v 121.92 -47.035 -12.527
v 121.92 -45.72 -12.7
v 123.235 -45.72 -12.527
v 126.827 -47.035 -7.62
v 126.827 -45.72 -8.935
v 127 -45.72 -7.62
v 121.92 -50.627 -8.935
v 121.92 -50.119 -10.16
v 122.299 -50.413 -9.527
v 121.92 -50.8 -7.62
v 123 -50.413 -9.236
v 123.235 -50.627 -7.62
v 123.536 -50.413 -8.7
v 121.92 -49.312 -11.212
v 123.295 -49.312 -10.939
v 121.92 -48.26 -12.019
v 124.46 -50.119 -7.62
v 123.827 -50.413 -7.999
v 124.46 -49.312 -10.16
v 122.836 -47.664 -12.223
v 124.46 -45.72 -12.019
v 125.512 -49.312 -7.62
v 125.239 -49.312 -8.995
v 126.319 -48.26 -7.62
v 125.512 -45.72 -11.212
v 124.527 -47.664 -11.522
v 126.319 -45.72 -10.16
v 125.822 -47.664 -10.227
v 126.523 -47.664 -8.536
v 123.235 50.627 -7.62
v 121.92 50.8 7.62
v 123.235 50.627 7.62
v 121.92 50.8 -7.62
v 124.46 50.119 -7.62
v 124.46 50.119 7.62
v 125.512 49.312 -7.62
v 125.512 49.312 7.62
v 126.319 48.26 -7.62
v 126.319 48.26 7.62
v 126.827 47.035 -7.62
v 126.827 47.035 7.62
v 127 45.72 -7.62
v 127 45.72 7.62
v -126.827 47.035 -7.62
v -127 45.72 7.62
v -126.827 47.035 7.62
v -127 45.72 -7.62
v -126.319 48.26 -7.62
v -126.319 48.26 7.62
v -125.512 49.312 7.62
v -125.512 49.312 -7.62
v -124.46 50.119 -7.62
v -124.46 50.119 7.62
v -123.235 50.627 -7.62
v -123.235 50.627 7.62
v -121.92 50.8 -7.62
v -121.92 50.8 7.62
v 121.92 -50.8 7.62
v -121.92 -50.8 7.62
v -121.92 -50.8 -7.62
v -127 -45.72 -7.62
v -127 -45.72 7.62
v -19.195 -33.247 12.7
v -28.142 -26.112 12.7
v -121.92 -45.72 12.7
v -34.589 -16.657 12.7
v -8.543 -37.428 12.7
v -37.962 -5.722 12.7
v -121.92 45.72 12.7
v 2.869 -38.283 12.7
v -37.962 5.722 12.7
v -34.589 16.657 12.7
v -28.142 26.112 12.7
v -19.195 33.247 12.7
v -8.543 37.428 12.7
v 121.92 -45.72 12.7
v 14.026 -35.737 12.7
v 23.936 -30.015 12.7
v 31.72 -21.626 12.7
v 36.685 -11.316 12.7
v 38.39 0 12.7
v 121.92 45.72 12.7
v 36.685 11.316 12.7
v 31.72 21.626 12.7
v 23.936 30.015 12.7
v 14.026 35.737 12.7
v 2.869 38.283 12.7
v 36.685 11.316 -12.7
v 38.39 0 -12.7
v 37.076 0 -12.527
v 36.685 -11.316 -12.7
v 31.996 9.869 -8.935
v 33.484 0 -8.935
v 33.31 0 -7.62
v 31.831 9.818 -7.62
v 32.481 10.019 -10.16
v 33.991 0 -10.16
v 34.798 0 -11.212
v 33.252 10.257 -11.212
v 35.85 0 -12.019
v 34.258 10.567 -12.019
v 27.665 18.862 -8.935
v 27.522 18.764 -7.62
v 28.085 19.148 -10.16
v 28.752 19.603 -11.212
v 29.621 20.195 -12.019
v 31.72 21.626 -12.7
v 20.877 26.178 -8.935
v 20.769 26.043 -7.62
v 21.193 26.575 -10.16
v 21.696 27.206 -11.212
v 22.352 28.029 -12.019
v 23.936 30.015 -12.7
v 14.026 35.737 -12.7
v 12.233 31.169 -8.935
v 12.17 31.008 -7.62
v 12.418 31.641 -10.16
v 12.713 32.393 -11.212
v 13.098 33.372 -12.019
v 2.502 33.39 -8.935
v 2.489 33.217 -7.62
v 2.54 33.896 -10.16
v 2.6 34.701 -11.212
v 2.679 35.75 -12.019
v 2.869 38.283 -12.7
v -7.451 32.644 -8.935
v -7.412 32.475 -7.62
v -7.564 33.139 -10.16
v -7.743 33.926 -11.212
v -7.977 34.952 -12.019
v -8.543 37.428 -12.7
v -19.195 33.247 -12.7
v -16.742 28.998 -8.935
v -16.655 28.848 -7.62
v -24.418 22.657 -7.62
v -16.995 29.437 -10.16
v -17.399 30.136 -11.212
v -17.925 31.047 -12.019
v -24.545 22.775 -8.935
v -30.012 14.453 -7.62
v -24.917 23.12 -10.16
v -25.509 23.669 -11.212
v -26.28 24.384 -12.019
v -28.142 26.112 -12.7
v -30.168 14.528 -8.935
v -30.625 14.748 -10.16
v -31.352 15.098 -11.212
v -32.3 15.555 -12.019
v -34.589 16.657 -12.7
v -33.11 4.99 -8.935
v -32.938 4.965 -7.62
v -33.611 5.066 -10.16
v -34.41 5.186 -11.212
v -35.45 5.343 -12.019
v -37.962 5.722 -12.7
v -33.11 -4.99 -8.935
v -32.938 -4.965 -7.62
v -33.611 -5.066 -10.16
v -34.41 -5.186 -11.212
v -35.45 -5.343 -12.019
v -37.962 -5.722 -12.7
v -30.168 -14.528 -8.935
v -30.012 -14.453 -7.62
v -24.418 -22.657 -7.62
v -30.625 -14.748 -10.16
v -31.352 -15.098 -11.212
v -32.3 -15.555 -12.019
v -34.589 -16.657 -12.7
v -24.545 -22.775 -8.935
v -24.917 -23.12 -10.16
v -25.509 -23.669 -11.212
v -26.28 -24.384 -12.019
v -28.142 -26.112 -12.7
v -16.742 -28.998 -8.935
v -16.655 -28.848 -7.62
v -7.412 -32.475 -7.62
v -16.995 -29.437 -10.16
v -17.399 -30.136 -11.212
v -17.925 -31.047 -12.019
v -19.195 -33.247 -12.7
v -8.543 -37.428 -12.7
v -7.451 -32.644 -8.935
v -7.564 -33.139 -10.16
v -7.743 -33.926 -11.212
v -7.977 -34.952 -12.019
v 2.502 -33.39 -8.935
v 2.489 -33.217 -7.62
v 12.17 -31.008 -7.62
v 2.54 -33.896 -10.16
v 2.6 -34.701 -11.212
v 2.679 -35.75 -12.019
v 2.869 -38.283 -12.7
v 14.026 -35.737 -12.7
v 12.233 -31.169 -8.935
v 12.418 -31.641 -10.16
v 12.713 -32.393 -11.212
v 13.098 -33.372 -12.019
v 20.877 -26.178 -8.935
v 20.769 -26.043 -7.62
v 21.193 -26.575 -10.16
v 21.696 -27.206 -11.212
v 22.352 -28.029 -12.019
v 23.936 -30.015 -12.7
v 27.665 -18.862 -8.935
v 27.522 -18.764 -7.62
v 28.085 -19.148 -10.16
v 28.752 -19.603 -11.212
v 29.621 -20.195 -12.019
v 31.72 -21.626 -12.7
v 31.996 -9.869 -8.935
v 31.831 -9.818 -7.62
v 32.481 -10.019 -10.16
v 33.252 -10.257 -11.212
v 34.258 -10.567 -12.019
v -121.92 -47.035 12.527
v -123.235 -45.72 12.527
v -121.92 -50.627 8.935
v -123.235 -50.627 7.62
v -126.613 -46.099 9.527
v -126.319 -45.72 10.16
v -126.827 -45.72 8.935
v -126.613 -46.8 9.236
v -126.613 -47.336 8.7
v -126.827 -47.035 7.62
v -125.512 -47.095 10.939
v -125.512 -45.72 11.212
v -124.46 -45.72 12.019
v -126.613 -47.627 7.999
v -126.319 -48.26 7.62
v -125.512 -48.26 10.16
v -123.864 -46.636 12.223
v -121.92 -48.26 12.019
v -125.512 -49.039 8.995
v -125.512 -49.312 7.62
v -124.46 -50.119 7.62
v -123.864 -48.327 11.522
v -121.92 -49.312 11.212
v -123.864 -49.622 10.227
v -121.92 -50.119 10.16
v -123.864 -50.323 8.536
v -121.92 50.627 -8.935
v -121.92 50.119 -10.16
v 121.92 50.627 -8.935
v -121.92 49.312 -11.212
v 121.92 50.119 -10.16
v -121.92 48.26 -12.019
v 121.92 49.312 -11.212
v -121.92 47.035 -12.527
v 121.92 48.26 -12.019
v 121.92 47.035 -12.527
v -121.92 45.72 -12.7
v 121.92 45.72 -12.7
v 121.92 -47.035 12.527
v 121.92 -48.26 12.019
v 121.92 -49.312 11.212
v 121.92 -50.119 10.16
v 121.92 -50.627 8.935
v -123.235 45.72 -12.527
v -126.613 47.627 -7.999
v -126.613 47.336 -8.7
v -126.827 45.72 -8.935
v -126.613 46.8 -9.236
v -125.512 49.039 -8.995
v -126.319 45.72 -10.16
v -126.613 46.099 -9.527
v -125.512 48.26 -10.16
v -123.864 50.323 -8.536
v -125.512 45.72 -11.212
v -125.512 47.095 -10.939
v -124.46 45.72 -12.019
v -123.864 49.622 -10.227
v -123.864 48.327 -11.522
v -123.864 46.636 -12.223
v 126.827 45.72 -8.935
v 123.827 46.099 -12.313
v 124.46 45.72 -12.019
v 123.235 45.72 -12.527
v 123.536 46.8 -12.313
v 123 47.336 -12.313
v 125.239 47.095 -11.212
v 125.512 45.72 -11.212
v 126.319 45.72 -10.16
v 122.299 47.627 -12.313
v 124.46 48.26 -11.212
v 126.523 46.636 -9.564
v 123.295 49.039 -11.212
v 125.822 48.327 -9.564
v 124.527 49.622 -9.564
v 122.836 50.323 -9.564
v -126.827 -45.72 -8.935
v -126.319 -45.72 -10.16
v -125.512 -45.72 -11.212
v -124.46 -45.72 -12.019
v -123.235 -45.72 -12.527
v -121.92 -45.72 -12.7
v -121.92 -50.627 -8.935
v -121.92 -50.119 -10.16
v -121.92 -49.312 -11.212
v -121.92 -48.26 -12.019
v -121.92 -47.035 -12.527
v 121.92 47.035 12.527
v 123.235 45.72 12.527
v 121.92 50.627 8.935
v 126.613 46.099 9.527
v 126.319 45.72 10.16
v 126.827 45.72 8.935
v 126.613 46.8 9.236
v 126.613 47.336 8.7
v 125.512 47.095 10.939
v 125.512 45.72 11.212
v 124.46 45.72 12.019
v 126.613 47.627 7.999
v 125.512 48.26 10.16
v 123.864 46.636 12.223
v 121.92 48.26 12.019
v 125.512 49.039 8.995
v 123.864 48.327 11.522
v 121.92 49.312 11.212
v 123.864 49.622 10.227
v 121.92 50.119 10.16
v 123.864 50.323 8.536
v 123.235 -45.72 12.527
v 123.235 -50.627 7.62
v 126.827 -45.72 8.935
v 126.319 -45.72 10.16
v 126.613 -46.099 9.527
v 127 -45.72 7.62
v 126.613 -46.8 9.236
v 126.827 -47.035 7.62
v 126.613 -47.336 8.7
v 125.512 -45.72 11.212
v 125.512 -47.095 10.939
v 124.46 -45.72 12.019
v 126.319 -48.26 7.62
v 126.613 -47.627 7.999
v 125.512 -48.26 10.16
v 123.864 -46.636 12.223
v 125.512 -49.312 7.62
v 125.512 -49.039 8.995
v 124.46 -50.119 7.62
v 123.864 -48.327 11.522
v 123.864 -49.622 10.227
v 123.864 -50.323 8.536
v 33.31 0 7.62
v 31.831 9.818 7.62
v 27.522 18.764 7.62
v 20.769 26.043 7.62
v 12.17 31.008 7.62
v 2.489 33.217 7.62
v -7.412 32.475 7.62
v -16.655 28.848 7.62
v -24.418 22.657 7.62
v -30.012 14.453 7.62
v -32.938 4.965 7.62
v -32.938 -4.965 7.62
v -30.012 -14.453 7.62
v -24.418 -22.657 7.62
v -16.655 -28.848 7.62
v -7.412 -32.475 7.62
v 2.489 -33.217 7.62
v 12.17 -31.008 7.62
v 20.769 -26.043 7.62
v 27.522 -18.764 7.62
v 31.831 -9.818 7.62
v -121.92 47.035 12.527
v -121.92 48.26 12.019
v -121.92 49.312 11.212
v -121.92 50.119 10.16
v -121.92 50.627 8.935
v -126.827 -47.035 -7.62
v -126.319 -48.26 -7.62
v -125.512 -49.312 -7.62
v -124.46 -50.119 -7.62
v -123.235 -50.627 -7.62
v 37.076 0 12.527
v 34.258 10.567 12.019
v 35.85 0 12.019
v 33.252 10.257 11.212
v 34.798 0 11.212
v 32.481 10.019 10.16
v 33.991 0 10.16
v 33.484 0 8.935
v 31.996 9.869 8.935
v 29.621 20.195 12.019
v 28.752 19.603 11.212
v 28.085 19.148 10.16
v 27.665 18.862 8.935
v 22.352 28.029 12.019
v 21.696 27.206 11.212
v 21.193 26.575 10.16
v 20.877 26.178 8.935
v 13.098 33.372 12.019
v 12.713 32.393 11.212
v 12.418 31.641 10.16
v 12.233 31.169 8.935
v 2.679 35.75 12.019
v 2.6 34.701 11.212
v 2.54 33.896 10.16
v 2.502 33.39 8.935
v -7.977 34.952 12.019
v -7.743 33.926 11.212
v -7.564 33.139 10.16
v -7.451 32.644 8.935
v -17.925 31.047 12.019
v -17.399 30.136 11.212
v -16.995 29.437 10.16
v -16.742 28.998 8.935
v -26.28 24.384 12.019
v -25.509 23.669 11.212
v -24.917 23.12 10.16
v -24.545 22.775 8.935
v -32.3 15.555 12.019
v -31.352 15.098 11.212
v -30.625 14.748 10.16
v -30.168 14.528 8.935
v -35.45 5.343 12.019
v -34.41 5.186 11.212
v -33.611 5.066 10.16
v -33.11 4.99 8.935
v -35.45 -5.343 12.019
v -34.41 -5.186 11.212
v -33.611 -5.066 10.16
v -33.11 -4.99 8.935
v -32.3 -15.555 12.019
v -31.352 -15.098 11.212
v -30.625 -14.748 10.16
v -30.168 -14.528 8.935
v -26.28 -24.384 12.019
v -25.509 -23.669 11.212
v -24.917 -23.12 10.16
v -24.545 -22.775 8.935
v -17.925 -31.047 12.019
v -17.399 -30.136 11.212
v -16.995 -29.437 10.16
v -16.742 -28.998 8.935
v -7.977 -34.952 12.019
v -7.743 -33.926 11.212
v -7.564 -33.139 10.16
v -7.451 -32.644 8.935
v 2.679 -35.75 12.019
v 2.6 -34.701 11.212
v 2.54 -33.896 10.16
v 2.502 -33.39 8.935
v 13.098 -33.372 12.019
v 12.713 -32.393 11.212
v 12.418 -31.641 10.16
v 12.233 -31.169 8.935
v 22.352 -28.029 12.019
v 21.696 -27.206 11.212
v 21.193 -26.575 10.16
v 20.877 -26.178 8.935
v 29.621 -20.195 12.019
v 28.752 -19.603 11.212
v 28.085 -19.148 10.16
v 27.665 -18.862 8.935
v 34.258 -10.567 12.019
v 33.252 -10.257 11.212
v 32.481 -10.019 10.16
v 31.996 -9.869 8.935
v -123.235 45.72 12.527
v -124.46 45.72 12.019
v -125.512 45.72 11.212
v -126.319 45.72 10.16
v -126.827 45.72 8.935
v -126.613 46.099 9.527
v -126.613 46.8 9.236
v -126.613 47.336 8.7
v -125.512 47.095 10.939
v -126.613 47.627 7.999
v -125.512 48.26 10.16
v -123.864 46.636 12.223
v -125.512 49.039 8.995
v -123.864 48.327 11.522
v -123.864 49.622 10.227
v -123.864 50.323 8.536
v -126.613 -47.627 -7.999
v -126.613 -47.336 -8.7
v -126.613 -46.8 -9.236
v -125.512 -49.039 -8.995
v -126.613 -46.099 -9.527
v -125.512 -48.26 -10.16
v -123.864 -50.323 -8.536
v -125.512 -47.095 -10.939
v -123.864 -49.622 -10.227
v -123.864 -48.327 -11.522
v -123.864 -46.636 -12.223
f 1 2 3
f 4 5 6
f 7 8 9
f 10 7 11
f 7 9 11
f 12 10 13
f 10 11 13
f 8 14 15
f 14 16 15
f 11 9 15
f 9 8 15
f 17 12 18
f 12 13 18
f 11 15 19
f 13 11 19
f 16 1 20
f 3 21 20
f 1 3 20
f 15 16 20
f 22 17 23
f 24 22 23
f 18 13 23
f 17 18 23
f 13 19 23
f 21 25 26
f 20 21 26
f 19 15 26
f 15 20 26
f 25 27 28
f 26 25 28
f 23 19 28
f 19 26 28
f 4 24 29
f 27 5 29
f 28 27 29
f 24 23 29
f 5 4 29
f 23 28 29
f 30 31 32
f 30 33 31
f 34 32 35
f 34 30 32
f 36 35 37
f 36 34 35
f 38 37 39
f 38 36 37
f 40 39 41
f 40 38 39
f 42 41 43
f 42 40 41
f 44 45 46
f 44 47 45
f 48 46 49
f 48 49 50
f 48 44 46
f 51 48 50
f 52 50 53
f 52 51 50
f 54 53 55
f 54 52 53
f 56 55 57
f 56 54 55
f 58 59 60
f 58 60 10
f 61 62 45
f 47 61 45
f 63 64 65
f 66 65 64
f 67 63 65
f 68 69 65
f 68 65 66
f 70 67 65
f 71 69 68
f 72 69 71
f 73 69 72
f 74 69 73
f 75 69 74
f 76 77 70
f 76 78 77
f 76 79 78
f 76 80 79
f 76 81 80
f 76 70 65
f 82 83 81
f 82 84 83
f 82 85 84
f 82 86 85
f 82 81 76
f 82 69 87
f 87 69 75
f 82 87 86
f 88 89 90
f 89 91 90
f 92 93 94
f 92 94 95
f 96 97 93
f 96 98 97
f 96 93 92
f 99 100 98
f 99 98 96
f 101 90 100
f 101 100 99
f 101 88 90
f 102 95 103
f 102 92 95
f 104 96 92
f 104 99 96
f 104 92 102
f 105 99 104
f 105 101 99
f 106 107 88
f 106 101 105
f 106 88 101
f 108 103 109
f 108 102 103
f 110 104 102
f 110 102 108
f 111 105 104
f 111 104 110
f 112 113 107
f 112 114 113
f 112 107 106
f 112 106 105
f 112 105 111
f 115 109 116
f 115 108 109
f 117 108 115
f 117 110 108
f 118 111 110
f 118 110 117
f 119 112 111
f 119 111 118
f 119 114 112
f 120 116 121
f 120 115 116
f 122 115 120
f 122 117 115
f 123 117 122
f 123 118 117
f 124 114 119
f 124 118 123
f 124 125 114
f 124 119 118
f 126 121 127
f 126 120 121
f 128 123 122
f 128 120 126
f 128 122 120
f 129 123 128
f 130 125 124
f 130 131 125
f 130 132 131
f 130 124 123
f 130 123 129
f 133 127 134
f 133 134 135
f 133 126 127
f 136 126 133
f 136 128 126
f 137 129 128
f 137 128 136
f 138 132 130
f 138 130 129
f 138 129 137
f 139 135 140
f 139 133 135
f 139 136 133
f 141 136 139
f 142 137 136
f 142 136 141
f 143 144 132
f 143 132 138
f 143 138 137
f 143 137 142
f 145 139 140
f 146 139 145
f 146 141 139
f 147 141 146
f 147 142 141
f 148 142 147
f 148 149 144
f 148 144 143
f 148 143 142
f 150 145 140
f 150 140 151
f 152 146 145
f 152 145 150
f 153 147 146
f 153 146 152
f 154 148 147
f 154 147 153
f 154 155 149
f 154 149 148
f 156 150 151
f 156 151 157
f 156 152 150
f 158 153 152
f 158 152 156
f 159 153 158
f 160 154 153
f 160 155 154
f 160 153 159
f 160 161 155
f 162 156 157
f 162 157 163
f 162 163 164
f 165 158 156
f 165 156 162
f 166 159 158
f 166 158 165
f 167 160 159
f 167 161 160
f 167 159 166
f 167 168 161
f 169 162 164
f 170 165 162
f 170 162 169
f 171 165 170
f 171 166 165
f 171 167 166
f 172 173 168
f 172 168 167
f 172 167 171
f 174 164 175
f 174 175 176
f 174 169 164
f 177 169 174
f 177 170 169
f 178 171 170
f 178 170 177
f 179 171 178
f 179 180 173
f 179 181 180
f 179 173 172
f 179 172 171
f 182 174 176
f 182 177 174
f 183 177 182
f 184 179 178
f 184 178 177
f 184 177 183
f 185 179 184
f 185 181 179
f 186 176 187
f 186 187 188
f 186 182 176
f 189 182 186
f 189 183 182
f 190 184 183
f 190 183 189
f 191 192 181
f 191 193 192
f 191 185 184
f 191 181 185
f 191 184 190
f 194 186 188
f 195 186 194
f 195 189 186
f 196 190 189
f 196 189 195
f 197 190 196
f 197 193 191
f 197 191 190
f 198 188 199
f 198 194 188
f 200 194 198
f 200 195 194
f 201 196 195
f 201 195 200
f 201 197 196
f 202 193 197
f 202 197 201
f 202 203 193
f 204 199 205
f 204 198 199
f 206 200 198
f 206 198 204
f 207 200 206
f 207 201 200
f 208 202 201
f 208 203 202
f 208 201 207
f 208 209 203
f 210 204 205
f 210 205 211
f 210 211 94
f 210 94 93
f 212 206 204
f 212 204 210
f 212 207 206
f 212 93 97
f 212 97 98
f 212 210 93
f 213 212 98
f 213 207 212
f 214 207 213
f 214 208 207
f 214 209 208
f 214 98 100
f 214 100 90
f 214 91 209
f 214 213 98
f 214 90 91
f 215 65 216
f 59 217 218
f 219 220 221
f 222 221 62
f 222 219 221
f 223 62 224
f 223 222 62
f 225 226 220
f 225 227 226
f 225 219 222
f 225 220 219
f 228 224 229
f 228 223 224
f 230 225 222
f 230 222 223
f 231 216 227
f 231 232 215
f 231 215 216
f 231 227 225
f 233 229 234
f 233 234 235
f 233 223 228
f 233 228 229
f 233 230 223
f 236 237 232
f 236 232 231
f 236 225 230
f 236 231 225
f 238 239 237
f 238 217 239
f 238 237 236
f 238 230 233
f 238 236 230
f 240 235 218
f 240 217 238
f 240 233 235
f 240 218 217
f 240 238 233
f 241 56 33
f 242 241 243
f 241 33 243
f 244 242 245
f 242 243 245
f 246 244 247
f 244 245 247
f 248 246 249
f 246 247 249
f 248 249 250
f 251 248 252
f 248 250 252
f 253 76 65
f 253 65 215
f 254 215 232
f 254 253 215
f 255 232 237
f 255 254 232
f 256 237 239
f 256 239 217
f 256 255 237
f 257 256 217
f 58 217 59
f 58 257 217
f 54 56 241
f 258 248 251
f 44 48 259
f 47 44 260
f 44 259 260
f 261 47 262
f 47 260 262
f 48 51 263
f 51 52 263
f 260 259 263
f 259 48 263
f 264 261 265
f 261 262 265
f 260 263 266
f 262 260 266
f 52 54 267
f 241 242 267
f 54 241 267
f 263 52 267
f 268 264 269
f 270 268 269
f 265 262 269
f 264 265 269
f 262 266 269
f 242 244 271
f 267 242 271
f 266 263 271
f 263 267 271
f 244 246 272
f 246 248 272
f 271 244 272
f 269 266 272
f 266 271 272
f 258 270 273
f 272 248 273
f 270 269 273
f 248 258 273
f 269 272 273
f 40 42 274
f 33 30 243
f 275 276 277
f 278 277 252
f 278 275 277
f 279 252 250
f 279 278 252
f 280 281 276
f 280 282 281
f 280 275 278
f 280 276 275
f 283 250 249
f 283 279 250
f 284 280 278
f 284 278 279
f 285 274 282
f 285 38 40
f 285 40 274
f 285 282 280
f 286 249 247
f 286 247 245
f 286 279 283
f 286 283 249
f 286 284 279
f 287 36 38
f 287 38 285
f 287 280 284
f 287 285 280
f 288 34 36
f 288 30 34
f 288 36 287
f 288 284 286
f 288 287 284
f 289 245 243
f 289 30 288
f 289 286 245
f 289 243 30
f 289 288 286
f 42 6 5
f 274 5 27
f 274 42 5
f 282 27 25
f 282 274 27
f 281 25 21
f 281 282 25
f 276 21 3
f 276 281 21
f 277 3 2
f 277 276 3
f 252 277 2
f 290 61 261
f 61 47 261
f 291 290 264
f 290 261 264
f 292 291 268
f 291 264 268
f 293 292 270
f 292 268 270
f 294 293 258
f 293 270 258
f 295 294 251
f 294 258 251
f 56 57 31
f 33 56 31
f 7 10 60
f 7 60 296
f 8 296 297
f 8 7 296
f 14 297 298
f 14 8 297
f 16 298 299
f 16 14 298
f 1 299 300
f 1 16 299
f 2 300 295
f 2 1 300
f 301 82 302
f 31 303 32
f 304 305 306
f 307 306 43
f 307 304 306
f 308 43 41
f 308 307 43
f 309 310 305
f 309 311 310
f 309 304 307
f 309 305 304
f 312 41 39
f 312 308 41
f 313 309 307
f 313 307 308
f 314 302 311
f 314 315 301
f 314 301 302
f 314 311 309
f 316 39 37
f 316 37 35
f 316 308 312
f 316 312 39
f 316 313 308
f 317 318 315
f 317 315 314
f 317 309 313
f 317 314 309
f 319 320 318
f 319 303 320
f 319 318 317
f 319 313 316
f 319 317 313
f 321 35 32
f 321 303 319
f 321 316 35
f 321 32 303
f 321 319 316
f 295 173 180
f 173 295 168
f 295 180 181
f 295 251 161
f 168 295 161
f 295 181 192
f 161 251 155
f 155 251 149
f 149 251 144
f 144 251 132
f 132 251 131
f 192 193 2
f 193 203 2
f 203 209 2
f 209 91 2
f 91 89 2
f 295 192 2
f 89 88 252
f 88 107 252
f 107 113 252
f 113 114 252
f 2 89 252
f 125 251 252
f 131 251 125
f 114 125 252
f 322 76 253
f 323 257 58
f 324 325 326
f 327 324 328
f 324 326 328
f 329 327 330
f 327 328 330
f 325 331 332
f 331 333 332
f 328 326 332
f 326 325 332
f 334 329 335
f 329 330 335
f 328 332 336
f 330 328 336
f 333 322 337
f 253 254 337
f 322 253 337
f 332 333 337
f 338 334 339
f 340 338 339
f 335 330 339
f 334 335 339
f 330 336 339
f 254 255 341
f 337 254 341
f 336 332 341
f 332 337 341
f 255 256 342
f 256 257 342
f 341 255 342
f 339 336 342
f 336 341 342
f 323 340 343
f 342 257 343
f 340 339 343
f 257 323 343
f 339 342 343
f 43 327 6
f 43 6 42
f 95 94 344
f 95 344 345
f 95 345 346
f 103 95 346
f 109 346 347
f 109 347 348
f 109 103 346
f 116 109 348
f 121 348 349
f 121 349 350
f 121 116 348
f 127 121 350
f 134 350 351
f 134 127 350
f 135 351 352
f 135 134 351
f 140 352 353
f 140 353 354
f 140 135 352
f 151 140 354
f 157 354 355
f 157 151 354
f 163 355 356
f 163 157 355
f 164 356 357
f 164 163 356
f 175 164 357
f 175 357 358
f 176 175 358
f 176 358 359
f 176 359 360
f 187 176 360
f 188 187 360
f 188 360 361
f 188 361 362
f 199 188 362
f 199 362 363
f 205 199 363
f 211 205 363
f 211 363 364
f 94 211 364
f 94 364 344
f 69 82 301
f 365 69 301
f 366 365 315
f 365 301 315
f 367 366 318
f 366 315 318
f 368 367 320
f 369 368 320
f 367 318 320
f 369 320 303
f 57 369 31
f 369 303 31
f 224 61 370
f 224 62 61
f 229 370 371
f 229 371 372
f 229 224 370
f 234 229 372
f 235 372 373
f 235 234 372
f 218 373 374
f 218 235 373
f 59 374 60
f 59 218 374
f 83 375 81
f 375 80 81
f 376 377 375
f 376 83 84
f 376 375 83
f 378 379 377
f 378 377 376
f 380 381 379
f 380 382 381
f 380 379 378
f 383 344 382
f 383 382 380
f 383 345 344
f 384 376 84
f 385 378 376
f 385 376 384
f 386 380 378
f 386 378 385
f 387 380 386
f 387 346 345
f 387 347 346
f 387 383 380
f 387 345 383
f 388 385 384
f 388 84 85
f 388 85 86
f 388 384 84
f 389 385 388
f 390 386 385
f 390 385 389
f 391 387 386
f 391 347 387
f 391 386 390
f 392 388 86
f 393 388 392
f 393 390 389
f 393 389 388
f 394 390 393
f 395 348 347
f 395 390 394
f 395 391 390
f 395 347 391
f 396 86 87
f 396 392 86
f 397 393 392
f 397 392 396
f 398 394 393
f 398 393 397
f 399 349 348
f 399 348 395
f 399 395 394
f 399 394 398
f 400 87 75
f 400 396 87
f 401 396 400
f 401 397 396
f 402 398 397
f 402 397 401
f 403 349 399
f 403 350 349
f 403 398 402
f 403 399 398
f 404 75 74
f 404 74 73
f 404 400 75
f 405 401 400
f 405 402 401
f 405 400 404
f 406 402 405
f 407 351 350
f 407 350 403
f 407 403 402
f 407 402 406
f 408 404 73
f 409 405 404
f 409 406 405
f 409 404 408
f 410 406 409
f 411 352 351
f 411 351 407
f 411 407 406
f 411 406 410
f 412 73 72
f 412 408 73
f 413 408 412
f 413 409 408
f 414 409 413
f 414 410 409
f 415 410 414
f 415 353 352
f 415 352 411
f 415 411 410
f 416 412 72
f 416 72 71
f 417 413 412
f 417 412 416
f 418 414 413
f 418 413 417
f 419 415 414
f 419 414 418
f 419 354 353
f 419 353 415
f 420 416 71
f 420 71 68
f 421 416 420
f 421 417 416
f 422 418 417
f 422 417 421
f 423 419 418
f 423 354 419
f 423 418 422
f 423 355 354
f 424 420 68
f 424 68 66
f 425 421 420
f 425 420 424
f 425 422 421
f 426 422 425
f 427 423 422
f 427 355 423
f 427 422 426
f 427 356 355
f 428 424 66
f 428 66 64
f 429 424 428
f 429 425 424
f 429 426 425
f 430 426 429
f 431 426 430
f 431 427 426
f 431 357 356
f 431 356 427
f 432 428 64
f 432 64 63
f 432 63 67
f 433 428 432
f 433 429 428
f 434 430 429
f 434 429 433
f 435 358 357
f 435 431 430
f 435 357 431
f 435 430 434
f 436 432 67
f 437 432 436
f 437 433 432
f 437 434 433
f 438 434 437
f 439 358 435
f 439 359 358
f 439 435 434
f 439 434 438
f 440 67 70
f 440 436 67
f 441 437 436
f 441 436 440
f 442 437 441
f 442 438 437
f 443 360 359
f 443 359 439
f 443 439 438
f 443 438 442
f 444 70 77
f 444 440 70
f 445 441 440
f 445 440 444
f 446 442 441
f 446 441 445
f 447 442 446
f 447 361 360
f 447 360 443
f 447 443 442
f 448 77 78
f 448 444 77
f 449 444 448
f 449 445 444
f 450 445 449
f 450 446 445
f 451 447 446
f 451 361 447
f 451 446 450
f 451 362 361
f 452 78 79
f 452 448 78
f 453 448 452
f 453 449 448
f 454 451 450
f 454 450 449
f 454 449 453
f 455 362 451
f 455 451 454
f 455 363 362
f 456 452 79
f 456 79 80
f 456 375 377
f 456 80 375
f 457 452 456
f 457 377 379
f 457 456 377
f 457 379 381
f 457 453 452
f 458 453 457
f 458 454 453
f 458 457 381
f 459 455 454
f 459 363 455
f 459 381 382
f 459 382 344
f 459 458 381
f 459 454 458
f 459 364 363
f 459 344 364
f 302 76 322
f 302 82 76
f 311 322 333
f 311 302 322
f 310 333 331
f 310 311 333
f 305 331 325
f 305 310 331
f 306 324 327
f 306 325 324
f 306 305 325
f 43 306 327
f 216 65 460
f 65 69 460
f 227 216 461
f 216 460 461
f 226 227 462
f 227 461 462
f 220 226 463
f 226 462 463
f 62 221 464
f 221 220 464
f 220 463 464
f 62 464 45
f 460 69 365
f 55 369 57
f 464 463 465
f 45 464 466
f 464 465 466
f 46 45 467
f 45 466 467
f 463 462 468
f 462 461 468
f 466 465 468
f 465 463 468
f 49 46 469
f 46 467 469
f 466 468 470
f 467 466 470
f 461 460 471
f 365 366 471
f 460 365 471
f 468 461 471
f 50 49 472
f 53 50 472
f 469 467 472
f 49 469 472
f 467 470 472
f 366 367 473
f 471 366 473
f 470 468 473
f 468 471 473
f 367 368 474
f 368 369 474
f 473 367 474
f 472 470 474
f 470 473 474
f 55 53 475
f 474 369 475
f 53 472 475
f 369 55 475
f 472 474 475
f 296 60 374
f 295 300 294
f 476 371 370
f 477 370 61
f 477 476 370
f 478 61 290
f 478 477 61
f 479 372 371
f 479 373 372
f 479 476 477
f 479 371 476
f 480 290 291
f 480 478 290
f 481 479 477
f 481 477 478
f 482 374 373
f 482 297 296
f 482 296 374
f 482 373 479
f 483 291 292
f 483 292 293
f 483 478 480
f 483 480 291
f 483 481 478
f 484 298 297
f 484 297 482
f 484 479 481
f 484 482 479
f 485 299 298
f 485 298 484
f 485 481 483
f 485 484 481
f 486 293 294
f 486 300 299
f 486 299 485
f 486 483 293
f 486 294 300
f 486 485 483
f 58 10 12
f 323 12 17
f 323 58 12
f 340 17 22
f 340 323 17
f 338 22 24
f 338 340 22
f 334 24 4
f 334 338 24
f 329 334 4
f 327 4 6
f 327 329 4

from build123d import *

# Parameters (mm, degrees)
F0_W     = 254
F0_H     = 101.6
F0_R     = 33.310406
F1_DEPTH = 12.7
F2_R     = 5.08
F3_R     = 5.08


with BuildPart() as f1:
    # F0 (on Top) → F1 (new body, symmetric)
    with BuildSketch(Plane.XY):
        Rectangle(F0_W, F0_H)
        Circle(F0_R, mode=Mode.SUBTRACT)
    extrude(amount=F1_DEPTH, both=True)

    # F2
    f2_edges = [f1.edges().sort_by_distance(p)[0] for p in [
        (-33.310406, 0, 12.7),
    ]]
    fillet(f2_edges, radius=F2_R)

    # F3
    f3_edges = [f1.edges().sort_by_distance(p)[0] for p in [
        (0, -50.8, 12.7),
        (0, 50.8, 12.7),
        (-127, 0, 12.7),
        (127, 0, 12.7),
        (127, 50.8, 0),
        (127, 0, -12.7),
        (0, 50.8, -12.7),
        (0, -50.8, -12.7),
        (-33.310406, 0, -12.7),
        (127, -50.8, 0),
        (-127, -50.8, 0),
        (-127, 50.8, 0),
        (-127, 0, -12.7),
    ]]
    fillet(f3_edges, radius=F3_R)


solid = f1.part
